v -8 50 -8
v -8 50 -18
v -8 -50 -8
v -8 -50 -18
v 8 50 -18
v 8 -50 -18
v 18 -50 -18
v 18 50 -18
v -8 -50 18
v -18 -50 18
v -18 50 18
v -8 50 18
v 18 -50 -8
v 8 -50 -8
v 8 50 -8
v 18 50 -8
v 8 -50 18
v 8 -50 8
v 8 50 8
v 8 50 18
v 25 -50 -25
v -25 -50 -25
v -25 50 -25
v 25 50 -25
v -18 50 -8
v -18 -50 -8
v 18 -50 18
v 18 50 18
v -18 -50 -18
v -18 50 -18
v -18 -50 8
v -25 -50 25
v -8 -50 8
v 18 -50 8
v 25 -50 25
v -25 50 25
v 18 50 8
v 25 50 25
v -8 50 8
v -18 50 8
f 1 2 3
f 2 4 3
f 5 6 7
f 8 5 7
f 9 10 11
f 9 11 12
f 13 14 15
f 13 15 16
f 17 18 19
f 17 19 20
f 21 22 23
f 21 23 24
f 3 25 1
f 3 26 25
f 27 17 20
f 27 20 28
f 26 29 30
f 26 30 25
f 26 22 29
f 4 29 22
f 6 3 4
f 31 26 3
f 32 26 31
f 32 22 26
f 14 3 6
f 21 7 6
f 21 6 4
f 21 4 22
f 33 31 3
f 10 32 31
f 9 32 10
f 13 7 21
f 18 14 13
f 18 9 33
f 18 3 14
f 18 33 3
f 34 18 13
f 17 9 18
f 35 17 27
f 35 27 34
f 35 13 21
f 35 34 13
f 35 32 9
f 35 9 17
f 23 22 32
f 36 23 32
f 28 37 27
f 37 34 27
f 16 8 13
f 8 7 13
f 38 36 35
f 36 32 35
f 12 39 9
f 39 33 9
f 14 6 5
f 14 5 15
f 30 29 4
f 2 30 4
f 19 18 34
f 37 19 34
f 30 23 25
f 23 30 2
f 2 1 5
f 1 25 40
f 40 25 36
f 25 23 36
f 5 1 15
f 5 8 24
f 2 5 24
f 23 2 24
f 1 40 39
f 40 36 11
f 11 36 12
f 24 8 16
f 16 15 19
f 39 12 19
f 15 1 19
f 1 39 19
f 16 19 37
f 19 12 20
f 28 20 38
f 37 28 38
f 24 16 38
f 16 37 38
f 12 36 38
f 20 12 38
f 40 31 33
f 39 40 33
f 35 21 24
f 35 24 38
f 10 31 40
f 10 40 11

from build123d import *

# Parameters (mm, degrees)
SKETCH002_W   = 50
SKETCH002_H   = 50
SKETCH002_W_2 = 10
SKETCH002_H_2 = 10
PAD_DEPTH     = 50


with BuildPart() as part:
    # Sketch002 → Pad (new body, symmetric)
    with BuildSketch(Plane.XZ):
        Rectangle(SKETCH002_W, SKETCH002_H)
        with Locations((-13, 13)):
            Rectangle(SKETCH002_W_2, SKETCH002_H_2, mode=Mode.SUBTRACT)
        with Locations((13, 13)):
            Rectangle(SKETCH002_W_2, SKETCH002_H_2, mode=Mode.SUBTRACT)
        with Locations((13, -13)):
            Rectangle(SKETCH002_W_2, SKETCH002_H_2, mode=Mode.SUBTRACT)
        with Locations((-13, -13)):
            Rectangle(SKETCH002_W_2, SKETCH002_H_2, mode=Mode.SUBTRACT)
    extrude(amount=PAD_DEPTH, both=True)


solid = part.part
